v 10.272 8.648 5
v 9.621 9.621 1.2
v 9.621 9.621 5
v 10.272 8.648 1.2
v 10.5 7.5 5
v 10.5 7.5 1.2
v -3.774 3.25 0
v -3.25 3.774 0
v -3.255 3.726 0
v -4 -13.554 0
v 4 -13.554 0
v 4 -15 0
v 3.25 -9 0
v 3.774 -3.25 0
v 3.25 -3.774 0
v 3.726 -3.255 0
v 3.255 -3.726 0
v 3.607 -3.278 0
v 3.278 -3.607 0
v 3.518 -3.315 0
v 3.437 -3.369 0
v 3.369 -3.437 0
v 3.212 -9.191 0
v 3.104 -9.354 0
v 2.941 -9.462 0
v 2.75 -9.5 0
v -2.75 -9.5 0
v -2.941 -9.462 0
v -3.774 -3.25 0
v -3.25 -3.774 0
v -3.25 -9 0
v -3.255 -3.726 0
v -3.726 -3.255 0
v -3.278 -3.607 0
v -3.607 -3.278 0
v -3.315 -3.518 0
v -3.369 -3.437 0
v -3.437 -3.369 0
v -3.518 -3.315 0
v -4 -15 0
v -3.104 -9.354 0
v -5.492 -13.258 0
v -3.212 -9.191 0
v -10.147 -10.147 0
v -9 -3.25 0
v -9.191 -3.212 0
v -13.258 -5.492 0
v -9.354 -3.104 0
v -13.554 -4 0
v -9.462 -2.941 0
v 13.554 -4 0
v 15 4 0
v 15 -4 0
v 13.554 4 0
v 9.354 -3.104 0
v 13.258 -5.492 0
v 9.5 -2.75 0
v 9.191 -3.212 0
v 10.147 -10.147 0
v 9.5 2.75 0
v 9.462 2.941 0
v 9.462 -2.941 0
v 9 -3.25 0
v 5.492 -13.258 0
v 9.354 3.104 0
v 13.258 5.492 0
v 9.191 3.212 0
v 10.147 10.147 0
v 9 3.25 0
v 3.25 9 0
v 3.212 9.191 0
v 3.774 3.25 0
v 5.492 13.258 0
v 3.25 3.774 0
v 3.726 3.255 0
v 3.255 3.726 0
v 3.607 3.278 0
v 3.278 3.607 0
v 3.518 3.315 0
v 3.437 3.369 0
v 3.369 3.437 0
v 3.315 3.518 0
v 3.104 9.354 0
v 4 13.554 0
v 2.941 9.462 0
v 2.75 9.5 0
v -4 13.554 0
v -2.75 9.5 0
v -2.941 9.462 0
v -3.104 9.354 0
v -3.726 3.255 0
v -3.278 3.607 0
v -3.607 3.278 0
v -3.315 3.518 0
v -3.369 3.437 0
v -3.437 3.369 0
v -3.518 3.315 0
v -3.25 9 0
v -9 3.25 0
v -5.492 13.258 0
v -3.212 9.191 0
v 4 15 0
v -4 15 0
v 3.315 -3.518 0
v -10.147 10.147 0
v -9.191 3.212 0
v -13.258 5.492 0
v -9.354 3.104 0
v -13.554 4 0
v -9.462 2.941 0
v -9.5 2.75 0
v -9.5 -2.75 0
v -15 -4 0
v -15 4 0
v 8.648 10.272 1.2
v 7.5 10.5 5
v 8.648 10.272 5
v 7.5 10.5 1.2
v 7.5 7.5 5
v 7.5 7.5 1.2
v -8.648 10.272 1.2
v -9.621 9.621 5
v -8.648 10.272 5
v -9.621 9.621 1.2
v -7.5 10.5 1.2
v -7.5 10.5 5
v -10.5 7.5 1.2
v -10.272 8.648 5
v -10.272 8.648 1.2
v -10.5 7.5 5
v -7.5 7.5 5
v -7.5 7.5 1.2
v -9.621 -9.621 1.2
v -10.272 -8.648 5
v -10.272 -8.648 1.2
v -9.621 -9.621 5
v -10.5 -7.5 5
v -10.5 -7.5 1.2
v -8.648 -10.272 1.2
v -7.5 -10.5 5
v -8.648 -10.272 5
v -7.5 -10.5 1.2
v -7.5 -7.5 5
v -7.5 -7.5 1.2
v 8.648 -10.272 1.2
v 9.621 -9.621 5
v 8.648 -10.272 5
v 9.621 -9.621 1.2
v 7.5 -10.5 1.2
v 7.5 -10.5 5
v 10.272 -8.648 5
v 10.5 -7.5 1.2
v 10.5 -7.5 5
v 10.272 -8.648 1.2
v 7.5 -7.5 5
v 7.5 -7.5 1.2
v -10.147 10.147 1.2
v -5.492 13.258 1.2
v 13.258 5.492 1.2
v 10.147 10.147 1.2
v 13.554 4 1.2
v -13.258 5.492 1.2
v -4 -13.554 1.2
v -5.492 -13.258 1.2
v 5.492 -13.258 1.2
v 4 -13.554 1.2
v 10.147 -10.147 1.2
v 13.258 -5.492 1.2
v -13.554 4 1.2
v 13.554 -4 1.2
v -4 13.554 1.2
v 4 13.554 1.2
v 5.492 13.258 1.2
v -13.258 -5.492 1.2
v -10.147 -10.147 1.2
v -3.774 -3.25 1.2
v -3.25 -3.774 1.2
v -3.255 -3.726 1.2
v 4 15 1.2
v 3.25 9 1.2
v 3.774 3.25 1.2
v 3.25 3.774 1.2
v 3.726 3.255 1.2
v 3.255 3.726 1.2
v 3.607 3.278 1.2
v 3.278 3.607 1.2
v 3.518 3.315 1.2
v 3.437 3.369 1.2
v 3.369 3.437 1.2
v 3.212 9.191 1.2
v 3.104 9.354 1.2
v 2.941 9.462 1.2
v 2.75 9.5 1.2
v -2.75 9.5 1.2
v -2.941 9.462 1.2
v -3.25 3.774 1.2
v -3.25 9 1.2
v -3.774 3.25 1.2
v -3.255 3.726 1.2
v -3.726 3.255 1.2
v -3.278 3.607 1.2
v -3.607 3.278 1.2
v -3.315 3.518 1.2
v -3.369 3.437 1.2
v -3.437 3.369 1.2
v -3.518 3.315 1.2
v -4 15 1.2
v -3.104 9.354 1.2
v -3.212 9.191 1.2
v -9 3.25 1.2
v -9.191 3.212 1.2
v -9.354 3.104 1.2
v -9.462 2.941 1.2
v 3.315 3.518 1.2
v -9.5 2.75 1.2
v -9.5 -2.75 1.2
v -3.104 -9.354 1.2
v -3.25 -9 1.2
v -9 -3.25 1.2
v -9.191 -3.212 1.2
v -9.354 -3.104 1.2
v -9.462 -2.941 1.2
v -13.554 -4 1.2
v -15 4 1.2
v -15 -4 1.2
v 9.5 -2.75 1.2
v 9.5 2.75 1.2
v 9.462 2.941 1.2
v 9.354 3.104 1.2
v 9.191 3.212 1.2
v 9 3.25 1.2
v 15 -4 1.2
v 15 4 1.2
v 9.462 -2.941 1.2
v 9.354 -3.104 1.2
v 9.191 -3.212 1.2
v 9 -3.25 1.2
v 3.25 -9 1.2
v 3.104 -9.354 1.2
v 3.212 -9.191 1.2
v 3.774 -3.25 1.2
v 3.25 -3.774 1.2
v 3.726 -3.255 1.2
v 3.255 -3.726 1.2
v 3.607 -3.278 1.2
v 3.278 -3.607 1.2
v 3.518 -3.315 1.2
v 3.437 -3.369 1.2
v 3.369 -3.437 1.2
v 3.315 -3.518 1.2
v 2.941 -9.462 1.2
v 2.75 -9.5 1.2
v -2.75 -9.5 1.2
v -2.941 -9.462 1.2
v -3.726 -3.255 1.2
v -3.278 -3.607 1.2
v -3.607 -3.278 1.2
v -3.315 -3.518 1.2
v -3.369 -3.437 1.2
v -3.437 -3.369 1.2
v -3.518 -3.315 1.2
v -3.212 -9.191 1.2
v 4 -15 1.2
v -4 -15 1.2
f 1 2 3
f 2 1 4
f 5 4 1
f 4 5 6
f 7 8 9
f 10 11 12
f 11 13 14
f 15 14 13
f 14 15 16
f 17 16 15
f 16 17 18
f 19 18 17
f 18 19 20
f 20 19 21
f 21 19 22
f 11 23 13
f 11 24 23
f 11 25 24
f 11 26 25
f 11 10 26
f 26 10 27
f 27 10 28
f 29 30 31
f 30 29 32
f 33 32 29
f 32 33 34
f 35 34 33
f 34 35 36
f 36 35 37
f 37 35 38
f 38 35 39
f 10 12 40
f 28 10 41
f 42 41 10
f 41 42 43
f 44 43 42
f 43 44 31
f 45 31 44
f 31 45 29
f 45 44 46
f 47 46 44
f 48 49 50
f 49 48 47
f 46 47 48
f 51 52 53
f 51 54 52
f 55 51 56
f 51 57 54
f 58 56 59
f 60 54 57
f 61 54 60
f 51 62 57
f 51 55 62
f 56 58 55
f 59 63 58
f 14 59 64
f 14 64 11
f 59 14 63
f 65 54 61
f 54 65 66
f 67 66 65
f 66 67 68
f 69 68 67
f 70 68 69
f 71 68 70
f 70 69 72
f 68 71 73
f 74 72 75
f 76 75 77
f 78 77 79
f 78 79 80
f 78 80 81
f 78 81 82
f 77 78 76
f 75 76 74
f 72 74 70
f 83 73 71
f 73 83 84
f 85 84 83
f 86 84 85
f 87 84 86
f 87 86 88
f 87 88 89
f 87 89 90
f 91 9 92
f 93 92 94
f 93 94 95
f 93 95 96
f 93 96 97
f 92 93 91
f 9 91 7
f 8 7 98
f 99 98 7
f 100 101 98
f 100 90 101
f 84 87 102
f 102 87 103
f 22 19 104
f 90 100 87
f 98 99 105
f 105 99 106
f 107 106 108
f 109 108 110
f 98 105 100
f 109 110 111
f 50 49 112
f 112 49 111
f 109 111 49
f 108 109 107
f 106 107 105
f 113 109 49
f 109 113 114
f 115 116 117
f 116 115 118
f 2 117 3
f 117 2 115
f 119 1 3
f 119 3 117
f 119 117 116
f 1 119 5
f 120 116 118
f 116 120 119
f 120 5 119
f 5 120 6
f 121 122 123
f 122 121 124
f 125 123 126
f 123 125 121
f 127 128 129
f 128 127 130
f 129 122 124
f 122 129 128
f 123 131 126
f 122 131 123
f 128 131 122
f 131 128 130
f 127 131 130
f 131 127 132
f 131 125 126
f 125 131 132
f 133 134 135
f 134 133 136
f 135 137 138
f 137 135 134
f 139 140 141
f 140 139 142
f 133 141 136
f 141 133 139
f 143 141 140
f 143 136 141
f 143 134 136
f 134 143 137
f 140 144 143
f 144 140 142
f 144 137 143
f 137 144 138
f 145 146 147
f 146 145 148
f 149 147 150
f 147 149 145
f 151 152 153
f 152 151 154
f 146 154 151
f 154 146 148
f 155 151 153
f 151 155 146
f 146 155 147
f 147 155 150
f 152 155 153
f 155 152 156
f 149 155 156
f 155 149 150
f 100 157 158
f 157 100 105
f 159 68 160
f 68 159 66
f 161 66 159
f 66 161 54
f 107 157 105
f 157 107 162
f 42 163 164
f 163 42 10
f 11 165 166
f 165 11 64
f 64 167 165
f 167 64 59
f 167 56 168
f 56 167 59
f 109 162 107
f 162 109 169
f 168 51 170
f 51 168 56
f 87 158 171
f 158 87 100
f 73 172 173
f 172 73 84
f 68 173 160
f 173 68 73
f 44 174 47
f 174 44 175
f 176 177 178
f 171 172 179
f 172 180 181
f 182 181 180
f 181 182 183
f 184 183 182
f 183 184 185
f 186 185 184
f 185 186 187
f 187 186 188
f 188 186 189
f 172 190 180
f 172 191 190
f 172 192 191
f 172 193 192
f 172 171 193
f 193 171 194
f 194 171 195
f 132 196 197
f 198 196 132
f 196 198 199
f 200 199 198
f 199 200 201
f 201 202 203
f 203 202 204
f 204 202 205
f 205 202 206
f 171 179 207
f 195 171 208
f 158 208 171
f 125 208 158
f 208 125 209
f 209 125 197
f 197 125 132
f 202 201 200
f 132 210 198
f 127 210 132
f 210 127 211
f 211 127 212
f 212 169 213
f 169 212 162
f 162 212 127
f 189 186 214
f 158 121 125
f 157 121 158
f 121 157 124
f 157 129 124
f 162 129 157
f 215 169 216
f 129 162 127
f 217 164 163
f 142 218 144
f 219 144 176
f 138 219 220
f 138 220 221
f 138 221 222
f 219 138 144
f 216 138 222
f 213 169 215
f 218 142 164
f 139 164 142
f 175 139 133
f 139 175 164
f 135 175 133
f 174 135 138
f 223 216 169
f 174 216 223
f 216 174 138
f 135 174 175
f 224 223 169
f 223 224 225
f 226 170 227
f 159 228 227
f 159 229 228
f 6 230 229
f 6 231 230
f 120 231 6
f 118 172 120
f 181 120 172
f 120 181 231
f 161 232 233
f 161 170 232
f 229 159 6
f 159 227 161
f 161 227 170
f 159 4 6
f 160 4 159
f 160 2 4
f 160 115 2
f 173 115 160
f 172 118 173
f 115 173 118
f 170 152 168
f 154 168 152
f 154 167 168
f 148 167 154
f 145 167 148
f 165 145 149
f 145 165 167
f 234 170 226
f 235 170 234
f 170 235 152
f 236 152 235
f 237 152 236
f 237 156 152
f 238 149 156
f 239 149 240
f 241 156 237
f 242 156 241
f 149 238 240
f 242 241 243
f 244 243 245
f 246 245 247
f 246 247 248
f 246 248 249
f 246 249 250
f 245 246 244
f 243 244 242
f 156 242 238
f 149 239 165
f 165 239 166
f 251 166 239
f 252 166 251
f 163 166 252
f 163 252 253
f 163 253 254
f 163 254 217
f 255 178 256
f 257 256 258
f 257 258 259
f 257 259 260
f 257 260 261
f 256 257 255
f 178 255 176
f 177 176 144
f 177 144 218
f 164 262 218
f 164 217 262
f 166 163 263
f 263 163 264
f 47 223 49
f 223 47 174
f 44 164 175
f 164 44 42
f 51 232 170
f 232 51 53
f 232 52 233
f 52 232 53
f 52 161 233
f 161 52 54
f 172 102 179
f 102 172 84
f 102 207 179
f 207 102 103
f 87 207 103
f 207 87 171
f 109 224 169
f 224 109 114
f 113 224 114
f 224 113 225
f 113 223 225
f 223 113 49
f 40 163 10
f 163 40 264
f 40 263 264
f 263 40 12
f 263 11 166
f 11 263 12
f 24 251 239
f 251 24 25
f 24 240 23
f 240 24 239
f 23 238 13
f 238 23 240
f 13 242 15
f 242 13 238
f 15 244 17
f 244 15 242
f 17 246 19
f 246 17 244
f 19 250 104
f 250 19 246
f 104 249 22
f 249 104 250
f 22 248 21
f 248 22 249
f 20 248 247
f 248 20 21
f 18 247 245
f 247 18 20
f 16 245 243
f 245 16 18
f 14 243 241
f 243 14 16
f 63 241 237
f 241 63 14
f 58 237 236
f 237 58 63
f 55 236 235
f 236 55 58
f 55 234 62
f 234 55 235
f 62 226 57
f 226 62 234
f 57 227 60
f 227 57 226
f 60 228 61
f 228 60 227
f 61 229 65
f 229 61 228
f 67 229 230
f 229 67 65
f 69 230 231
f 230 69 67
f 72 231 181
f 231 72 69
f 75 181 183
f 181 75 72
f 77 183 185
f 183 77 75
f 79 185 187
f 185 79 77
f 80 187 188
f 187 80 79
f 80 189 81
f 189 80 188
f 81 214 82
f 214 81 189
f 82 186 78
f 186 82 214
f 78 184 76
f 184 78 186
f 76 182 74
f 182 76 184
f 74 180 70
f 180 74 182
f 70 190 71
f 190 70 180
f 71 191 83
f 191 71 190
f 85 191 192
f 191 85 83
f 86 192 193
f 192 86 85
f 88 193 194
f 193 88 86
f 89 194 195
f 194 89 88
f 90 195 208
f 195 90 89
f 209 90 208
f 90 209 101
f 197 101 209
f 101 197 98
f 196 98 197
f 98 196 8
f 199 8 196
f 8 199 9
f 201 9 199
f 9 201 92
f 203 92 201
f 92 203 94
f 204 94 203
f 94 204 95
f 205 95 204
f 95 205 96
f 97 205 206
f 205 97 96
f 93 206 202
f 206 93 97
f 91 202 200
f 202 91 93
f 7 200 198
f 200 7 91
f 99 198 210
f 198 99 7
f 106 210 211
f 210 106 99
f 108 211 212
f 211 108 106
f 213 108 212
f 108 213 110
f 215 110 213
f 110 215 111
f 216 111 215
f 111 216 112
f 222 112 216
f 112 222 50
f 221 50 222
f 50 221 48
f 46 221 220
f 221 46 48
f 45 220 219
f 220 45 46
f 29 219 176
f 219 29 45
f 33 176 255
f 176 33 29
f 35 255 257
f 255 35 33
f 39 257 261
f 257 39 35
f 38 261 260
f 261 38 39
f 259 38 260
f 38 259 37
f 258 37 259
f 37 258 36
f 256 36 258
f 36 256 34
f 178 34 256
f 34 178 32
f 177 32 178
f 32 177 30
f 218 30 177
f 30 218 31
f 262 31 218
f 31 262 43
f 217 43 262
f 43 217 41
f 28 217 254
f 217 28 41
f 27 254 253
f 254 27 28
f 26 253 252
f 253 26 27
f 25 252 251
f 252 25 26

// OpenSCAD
// file: common.scad
// Copyright 2019 a.j.buxton@gmail.com
// CC BY-NC-ND 4.0

w = 150.5;
h = 65;


// abxy and dpad holes
button_hole_diameter = 29;
// analog stick
analog_hole_diameter = 22.5;

button_radius = 8.4/2;
button_height = 4.5;

button_letters = ["A", "B", "X", "Y"];
button_rotations = [180, 90, 270, 0];
button_colours = [[1.0, 0.1, 0.1], [1, 0.8, 0], [0.1, 0.3, 1], [0, 0.8, 0]];


small_button_radius = 5.2/2;
small_button_letters = ["H", "M"];
small_button_rotations = [180, 0];


module twobytwo() {
    children();
    rotate(90) children();
    rotate(180) children();
    rotate(270) children();
}

module base_insert(thickness) {
    cylinder(d=button_hole_diameter-0.3, h=thickness);
    linear_extrude(height=thickness, convexity=2) {
        square([8, 30], center=true);
        square([30, 8], center=true);
    }
    twobytwo() translate([7.5, 7.5, 0]) intersection() {
        cylinder(d=6, h=5);
        cube(10);
    }
}

module outline() {
    offset(5) offset(-5) square([w, h], center=true);
}


module shell(height=7.6) {
    difference() {
        linear_extrude(height=height, convexity=2) difference() {
            offset(1.6) outline();
            outline();

        }
    }
}


module dpad_pos() {
    translate([(w/2)-17.5, -9]) children();
}

module analog_pos() {
    translate([(w/2)-16.75, 21.25]) children();
}

module btn_pos() {
    translate([18.7-(w/2), 10.4]) children();
}

module smlbtn_pos() {
    translate([18.7-(w/2), -17.5]) children();
}

module led_pos() {
    translate([-48.75, 30]) children();
    translate([-56.75, 30]) children();
    translate([-64.75, 30]) children();
}

module screw_pos(internal=true) {
    translate([0, 0.2, 0]) {
        translate([143.5/2, 0]) {
            translate([0, -29]) children();
            if (internal) translate([0, 0]) children();
            translate([0, 29]) children();
            if (internal) translate([-30, 0]) {
                //translate([0, -29]) children();
                translate([0, 0]) children();
                translate([0, 29]) children();
            }
        }
        translate([-144.5/2, 0]) {
            translate([0, -29]) children();
            if (internal) translate([0, 0]) children();
            translate([0, 29]) children();
            if (internal) translate([30, 0]) {
                translate([0, -29]) children();
                //translate([0, 0]) children();
                translate([0, 29]) children();
            }
        }
    }
}


// TODO: Remove these
// main file
// Copyright 2019 a.j.buxton@gmail.com
// CC BY-NC-ND 4.0

include <common.scad>;

RES = undef;

$fn = RES ? RES : 16;



module dpad() {
    offset(r=0.5) offset(r=-0.5) offset(r=-0.5) offset(r=0.5) union() {
        square([6.5, 19], center=true);
        square([19, 6.5], center=true);
    }
}



module dpad_insert() {

    front_thickness = 1.2;
/*
    translate([0, 0, front_thickness]) difference() {
        linear_extrude(height=1.6, convexity=2) offset(1) rubber() button_base();
        translate([0, 0, -0.1]) linear_extrude(height=10, convexity=4) button_positions() offset(0.4) button_base();
        translate([0, 0, 1.45]) cube([5.7, 4.8, 3], center=true);
    }
*/

    difference() {
        base_insert(front_thickness);
        translate([0, 0, -0.1]) linear_extrude(height=20, convexity=2) dpad();
    }
}


dpad_insert();
